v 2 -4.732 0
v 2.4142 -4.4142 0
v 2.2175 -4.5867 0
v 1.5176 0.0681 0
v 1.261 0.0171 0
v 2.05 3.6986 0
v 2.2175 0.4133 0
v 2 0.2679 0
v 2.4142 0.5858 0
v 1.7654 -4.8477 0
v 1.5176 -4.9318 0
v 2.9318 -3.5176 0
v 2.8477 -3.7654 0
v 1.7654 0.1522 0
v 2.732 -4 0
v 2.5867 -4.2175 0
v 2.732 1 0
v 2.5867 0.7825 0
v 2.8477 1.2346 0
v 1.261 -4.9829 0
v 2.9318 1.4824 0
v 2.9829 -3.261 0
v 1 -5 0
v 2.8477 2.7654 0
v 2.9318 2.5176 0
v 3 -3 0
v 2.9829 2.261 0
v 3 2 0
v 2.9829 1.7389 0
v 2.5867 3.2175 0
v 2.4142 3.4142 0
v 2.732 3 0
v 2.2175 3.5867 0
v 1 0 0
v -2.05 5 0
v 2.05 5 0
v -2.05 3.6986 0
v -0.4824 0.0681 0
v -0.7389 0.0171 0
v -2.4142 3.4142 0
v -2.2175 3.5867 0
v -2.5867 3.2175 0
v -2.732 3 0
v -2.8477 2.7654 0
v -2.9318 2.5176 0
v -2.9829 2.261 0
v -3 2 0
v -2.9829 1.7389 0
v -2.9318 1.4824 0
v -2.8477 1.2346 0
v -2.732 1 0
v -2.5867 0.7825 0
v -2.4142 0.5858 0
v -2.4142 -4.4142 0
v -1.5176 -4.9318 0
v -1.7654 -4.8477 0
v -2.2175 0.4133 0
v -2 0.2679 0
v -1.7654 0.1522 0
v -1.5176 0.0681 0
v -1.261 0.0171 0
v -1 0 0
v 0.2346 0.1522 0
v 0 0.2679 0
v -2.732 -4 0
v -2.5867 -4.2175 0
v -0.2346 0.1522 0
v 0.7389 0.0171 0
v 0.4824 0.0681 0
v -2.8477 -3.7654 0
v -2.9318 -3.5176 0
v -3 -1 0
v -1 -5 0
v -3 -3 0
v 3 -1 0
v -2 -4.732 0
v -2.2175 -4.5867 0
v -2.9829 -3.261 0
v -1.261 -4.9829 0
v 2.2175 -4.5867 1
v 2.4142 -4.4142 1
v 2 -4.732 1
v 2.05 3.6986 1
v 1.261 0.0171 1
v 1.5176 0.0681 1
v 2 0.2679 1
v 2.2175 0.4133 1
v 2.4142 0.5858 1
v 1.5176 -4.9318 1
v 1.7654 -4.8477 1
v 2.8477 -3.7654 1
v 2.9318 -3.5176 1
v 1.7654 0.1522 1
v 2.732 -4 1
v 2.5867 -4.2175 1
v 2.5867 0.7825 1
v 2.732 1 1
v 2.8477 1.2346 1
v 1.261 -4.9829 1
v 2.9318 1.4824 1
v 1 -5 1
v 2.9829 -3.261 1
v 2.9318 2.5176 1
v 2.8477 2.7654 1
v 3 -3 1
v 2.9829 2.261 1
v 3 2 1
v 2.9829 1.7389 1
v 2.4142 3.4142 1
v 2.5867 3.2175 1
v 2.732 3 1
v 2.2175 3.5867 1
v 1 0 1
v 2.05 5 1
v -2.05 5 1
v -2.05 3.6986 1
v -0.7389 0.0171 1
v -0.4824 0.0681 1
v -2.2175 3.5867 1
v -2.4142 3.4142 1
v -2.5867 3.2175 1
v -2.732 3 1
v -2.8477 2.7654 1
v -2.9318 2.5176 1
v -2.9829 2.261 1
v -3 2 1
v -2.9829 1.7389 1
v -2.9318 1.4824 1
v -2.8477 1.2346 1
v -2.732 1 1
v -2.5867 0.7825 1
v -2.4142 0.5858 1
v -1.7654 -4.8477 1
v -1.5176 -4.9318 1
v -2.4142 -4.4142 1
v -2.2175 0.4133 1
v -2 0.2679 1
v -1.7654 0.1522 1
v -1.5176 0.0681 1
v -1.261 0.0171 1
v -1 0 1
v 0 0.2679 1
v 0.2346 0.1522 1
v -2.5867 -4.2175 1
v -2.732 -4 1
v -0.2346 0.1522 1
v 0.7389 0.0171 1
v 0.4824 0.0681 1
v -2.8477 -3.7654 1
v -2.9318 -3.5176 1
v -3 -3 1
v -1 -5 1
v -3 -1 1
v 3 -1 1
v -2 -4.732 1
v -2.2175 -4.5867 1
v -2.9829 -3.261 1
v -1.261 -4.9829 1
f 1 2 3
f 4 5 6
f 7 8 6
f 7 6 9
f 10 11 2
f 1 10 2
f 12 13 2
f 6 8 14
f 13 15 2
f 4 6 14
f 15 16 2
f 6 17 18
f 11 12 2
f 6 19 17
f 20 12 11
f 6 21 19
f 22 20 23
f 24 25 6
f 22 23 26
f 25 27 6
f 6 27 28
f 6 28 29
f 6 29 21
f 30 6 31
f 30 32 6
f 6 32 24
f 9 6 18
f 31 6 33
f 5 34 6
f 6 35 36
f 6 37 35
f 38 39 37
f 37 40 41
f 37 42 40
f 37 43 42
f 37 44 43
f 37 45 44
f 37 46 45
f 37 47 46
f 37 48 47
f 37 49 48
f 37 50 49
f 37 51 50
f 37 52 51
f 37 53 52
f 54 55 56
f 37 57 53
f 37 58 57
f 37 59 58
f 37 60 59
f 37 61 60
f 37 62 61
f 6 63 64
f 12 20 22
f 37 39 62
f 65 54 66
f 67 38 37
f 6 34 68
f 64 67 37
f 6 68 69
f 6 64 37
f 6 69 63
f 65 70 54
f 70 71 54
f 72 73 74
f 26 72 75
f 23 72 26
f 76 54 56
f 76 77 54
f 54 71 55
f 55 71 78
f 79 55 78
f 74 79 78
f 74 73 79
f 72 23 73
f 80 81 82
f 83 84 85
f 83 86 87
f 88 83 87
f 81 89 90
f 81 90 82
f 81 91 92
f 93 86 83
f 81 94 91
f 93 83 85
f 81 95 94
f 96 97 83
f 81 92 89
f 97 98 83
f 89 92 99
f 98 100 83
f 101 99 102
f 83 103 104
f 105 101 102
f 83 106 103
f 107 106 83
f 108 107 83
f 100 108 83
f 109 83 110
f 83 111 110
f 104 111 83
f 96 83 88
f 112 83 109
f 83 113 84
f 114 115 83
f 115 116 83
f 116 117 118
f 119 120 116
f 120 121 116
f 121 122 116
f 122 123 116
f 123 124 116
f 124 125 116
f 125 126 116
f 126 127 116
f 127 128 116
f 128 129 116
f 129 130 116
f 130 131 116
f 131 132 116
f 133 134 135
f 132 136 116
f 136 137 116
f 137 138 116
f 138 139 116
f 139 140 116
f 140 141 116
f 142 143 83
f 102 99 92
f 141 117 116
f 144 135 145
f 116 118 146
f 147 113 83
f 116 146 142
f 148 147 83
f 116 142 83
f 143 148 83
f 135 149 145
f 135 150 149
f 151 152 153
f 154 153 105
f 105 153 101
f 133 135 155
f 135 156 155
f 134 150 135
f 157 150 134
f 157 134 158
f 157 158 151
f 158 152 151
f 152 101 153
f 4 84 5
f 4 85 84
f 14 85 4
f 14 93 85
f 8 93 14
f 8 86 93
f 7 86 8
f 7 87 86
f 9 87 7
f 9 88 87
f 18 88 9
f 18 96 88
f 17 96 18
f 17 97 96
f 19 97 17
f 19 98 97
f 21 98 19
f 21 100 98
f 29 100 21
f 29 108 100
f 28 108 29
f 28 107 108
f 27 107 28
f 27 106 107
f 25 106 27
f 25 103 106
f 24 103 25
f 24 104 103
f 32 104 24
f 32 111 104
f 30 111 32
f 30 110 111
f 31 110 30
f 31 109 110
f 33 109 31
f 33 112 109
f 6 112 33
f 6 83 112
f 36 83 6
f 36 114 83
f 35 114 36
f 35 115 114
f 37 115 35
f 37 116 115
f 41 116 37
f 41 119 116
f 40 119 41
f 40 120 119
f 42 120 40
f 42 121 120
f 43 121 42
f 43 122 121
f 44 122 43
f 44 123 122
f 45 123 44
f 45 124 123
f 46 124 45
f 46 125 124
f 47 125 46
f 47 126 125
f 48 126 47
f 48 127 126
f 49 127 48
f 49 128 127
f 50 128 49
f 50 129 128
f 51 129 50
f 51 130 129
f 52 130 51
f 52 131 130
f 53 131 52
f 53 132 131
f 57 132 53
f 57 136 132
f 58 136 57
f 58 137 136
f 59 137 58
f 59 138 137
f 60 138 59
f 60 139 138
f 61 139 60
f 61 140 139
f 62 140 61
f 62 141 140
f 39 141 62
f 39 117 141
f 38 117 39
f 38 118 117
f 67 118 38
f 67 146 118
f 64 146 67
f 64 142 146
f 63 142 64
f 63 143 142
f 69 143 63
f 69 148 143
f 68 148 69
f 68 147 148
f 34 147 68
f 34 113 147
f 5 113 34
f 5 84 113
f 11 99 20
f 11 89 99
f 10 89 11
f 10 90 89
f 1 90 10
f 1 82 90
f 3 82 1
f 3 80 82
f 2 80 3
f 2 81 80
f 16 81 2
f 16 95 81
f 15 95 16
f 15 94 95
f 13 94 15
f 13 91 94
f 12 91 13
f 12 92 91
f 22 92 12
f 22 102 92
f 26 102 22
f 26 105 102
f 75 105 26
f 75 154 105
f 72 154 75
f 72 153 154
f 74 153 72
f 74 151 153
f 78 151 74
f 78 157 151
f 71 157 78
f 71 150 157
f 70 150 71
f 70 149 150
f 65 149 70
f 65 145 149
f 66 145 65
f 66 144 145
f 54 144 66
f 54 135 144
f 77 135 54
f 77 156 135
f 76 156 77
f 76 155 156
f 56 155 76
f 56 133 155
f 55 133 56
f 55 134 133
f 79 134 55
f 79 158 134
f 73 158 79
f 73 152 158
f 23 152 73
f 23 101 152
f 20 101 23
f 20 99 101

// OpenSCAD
// part_id: cp-f1
// name: Fork 1.5W 3D 5L 6T
// source_drawing_ids: DRW-005
// units: mm
// revision: 0.1
// SPDX-License-Identifier: MIT

module cpf1_base_blank_2d() {
    body_w = 6.0;
    body_side_y = -3.0;
    body_top_y = 5.0;
    corner_r = 2.0;
    corner_center_x = 1.0;
    corner_center_y = -3.0;

    union() {
        translate([-body_w / 2, body_side_y])
            square([body_w, body_top_y - body_side_y], center = false);

        hull() {
            translate([-corner_center_x, corner_center_y])
                circle(r = corner_r, $fn = 48);
            translate([corner_center_x, corner_center_y])
                circle(r = corner_r, $fn = 48);
        }
    }
}

module cpf1_profile_2d(center = true) {
    stem_w = 1.5 + 1.3 + 1.3;
    stem_half_w = stem_w / 2;
    body_top_y = 5.0;
    corner_r = 2.0;
    corner_center_y = -3.0;
    y_center = (body_top_y - (corner_center_y - corner_r)) / 2 + (corner_center_y - corner_r);

    translate([0, center ? -y_center : 0])
    union() {
        difference() {
            cpf1_base_blank_2d();

            translate([-10, -1.0])
                square([20, 10], center = false);
        }

        translate([-stem_half_w, 2.0])
            square([stem_w, body_top_y - 2.0], center = false);

        translate([-1.0, 2.0])
            circle(r = 2.0, $fn = 48);
        translate([1.0, 2.0])
            circle(r = 2.0, $fn = 48);
    }
}

module part_cpf1(th = 1.0) {
    linear_extrude(height = th)
        cpf1_profile_2d();
}

// ---- "main guard" ----
// Default to previewing when opened directly:
if (is_undef(__LIB_MODE__)) {
    part_cpf1();
}
